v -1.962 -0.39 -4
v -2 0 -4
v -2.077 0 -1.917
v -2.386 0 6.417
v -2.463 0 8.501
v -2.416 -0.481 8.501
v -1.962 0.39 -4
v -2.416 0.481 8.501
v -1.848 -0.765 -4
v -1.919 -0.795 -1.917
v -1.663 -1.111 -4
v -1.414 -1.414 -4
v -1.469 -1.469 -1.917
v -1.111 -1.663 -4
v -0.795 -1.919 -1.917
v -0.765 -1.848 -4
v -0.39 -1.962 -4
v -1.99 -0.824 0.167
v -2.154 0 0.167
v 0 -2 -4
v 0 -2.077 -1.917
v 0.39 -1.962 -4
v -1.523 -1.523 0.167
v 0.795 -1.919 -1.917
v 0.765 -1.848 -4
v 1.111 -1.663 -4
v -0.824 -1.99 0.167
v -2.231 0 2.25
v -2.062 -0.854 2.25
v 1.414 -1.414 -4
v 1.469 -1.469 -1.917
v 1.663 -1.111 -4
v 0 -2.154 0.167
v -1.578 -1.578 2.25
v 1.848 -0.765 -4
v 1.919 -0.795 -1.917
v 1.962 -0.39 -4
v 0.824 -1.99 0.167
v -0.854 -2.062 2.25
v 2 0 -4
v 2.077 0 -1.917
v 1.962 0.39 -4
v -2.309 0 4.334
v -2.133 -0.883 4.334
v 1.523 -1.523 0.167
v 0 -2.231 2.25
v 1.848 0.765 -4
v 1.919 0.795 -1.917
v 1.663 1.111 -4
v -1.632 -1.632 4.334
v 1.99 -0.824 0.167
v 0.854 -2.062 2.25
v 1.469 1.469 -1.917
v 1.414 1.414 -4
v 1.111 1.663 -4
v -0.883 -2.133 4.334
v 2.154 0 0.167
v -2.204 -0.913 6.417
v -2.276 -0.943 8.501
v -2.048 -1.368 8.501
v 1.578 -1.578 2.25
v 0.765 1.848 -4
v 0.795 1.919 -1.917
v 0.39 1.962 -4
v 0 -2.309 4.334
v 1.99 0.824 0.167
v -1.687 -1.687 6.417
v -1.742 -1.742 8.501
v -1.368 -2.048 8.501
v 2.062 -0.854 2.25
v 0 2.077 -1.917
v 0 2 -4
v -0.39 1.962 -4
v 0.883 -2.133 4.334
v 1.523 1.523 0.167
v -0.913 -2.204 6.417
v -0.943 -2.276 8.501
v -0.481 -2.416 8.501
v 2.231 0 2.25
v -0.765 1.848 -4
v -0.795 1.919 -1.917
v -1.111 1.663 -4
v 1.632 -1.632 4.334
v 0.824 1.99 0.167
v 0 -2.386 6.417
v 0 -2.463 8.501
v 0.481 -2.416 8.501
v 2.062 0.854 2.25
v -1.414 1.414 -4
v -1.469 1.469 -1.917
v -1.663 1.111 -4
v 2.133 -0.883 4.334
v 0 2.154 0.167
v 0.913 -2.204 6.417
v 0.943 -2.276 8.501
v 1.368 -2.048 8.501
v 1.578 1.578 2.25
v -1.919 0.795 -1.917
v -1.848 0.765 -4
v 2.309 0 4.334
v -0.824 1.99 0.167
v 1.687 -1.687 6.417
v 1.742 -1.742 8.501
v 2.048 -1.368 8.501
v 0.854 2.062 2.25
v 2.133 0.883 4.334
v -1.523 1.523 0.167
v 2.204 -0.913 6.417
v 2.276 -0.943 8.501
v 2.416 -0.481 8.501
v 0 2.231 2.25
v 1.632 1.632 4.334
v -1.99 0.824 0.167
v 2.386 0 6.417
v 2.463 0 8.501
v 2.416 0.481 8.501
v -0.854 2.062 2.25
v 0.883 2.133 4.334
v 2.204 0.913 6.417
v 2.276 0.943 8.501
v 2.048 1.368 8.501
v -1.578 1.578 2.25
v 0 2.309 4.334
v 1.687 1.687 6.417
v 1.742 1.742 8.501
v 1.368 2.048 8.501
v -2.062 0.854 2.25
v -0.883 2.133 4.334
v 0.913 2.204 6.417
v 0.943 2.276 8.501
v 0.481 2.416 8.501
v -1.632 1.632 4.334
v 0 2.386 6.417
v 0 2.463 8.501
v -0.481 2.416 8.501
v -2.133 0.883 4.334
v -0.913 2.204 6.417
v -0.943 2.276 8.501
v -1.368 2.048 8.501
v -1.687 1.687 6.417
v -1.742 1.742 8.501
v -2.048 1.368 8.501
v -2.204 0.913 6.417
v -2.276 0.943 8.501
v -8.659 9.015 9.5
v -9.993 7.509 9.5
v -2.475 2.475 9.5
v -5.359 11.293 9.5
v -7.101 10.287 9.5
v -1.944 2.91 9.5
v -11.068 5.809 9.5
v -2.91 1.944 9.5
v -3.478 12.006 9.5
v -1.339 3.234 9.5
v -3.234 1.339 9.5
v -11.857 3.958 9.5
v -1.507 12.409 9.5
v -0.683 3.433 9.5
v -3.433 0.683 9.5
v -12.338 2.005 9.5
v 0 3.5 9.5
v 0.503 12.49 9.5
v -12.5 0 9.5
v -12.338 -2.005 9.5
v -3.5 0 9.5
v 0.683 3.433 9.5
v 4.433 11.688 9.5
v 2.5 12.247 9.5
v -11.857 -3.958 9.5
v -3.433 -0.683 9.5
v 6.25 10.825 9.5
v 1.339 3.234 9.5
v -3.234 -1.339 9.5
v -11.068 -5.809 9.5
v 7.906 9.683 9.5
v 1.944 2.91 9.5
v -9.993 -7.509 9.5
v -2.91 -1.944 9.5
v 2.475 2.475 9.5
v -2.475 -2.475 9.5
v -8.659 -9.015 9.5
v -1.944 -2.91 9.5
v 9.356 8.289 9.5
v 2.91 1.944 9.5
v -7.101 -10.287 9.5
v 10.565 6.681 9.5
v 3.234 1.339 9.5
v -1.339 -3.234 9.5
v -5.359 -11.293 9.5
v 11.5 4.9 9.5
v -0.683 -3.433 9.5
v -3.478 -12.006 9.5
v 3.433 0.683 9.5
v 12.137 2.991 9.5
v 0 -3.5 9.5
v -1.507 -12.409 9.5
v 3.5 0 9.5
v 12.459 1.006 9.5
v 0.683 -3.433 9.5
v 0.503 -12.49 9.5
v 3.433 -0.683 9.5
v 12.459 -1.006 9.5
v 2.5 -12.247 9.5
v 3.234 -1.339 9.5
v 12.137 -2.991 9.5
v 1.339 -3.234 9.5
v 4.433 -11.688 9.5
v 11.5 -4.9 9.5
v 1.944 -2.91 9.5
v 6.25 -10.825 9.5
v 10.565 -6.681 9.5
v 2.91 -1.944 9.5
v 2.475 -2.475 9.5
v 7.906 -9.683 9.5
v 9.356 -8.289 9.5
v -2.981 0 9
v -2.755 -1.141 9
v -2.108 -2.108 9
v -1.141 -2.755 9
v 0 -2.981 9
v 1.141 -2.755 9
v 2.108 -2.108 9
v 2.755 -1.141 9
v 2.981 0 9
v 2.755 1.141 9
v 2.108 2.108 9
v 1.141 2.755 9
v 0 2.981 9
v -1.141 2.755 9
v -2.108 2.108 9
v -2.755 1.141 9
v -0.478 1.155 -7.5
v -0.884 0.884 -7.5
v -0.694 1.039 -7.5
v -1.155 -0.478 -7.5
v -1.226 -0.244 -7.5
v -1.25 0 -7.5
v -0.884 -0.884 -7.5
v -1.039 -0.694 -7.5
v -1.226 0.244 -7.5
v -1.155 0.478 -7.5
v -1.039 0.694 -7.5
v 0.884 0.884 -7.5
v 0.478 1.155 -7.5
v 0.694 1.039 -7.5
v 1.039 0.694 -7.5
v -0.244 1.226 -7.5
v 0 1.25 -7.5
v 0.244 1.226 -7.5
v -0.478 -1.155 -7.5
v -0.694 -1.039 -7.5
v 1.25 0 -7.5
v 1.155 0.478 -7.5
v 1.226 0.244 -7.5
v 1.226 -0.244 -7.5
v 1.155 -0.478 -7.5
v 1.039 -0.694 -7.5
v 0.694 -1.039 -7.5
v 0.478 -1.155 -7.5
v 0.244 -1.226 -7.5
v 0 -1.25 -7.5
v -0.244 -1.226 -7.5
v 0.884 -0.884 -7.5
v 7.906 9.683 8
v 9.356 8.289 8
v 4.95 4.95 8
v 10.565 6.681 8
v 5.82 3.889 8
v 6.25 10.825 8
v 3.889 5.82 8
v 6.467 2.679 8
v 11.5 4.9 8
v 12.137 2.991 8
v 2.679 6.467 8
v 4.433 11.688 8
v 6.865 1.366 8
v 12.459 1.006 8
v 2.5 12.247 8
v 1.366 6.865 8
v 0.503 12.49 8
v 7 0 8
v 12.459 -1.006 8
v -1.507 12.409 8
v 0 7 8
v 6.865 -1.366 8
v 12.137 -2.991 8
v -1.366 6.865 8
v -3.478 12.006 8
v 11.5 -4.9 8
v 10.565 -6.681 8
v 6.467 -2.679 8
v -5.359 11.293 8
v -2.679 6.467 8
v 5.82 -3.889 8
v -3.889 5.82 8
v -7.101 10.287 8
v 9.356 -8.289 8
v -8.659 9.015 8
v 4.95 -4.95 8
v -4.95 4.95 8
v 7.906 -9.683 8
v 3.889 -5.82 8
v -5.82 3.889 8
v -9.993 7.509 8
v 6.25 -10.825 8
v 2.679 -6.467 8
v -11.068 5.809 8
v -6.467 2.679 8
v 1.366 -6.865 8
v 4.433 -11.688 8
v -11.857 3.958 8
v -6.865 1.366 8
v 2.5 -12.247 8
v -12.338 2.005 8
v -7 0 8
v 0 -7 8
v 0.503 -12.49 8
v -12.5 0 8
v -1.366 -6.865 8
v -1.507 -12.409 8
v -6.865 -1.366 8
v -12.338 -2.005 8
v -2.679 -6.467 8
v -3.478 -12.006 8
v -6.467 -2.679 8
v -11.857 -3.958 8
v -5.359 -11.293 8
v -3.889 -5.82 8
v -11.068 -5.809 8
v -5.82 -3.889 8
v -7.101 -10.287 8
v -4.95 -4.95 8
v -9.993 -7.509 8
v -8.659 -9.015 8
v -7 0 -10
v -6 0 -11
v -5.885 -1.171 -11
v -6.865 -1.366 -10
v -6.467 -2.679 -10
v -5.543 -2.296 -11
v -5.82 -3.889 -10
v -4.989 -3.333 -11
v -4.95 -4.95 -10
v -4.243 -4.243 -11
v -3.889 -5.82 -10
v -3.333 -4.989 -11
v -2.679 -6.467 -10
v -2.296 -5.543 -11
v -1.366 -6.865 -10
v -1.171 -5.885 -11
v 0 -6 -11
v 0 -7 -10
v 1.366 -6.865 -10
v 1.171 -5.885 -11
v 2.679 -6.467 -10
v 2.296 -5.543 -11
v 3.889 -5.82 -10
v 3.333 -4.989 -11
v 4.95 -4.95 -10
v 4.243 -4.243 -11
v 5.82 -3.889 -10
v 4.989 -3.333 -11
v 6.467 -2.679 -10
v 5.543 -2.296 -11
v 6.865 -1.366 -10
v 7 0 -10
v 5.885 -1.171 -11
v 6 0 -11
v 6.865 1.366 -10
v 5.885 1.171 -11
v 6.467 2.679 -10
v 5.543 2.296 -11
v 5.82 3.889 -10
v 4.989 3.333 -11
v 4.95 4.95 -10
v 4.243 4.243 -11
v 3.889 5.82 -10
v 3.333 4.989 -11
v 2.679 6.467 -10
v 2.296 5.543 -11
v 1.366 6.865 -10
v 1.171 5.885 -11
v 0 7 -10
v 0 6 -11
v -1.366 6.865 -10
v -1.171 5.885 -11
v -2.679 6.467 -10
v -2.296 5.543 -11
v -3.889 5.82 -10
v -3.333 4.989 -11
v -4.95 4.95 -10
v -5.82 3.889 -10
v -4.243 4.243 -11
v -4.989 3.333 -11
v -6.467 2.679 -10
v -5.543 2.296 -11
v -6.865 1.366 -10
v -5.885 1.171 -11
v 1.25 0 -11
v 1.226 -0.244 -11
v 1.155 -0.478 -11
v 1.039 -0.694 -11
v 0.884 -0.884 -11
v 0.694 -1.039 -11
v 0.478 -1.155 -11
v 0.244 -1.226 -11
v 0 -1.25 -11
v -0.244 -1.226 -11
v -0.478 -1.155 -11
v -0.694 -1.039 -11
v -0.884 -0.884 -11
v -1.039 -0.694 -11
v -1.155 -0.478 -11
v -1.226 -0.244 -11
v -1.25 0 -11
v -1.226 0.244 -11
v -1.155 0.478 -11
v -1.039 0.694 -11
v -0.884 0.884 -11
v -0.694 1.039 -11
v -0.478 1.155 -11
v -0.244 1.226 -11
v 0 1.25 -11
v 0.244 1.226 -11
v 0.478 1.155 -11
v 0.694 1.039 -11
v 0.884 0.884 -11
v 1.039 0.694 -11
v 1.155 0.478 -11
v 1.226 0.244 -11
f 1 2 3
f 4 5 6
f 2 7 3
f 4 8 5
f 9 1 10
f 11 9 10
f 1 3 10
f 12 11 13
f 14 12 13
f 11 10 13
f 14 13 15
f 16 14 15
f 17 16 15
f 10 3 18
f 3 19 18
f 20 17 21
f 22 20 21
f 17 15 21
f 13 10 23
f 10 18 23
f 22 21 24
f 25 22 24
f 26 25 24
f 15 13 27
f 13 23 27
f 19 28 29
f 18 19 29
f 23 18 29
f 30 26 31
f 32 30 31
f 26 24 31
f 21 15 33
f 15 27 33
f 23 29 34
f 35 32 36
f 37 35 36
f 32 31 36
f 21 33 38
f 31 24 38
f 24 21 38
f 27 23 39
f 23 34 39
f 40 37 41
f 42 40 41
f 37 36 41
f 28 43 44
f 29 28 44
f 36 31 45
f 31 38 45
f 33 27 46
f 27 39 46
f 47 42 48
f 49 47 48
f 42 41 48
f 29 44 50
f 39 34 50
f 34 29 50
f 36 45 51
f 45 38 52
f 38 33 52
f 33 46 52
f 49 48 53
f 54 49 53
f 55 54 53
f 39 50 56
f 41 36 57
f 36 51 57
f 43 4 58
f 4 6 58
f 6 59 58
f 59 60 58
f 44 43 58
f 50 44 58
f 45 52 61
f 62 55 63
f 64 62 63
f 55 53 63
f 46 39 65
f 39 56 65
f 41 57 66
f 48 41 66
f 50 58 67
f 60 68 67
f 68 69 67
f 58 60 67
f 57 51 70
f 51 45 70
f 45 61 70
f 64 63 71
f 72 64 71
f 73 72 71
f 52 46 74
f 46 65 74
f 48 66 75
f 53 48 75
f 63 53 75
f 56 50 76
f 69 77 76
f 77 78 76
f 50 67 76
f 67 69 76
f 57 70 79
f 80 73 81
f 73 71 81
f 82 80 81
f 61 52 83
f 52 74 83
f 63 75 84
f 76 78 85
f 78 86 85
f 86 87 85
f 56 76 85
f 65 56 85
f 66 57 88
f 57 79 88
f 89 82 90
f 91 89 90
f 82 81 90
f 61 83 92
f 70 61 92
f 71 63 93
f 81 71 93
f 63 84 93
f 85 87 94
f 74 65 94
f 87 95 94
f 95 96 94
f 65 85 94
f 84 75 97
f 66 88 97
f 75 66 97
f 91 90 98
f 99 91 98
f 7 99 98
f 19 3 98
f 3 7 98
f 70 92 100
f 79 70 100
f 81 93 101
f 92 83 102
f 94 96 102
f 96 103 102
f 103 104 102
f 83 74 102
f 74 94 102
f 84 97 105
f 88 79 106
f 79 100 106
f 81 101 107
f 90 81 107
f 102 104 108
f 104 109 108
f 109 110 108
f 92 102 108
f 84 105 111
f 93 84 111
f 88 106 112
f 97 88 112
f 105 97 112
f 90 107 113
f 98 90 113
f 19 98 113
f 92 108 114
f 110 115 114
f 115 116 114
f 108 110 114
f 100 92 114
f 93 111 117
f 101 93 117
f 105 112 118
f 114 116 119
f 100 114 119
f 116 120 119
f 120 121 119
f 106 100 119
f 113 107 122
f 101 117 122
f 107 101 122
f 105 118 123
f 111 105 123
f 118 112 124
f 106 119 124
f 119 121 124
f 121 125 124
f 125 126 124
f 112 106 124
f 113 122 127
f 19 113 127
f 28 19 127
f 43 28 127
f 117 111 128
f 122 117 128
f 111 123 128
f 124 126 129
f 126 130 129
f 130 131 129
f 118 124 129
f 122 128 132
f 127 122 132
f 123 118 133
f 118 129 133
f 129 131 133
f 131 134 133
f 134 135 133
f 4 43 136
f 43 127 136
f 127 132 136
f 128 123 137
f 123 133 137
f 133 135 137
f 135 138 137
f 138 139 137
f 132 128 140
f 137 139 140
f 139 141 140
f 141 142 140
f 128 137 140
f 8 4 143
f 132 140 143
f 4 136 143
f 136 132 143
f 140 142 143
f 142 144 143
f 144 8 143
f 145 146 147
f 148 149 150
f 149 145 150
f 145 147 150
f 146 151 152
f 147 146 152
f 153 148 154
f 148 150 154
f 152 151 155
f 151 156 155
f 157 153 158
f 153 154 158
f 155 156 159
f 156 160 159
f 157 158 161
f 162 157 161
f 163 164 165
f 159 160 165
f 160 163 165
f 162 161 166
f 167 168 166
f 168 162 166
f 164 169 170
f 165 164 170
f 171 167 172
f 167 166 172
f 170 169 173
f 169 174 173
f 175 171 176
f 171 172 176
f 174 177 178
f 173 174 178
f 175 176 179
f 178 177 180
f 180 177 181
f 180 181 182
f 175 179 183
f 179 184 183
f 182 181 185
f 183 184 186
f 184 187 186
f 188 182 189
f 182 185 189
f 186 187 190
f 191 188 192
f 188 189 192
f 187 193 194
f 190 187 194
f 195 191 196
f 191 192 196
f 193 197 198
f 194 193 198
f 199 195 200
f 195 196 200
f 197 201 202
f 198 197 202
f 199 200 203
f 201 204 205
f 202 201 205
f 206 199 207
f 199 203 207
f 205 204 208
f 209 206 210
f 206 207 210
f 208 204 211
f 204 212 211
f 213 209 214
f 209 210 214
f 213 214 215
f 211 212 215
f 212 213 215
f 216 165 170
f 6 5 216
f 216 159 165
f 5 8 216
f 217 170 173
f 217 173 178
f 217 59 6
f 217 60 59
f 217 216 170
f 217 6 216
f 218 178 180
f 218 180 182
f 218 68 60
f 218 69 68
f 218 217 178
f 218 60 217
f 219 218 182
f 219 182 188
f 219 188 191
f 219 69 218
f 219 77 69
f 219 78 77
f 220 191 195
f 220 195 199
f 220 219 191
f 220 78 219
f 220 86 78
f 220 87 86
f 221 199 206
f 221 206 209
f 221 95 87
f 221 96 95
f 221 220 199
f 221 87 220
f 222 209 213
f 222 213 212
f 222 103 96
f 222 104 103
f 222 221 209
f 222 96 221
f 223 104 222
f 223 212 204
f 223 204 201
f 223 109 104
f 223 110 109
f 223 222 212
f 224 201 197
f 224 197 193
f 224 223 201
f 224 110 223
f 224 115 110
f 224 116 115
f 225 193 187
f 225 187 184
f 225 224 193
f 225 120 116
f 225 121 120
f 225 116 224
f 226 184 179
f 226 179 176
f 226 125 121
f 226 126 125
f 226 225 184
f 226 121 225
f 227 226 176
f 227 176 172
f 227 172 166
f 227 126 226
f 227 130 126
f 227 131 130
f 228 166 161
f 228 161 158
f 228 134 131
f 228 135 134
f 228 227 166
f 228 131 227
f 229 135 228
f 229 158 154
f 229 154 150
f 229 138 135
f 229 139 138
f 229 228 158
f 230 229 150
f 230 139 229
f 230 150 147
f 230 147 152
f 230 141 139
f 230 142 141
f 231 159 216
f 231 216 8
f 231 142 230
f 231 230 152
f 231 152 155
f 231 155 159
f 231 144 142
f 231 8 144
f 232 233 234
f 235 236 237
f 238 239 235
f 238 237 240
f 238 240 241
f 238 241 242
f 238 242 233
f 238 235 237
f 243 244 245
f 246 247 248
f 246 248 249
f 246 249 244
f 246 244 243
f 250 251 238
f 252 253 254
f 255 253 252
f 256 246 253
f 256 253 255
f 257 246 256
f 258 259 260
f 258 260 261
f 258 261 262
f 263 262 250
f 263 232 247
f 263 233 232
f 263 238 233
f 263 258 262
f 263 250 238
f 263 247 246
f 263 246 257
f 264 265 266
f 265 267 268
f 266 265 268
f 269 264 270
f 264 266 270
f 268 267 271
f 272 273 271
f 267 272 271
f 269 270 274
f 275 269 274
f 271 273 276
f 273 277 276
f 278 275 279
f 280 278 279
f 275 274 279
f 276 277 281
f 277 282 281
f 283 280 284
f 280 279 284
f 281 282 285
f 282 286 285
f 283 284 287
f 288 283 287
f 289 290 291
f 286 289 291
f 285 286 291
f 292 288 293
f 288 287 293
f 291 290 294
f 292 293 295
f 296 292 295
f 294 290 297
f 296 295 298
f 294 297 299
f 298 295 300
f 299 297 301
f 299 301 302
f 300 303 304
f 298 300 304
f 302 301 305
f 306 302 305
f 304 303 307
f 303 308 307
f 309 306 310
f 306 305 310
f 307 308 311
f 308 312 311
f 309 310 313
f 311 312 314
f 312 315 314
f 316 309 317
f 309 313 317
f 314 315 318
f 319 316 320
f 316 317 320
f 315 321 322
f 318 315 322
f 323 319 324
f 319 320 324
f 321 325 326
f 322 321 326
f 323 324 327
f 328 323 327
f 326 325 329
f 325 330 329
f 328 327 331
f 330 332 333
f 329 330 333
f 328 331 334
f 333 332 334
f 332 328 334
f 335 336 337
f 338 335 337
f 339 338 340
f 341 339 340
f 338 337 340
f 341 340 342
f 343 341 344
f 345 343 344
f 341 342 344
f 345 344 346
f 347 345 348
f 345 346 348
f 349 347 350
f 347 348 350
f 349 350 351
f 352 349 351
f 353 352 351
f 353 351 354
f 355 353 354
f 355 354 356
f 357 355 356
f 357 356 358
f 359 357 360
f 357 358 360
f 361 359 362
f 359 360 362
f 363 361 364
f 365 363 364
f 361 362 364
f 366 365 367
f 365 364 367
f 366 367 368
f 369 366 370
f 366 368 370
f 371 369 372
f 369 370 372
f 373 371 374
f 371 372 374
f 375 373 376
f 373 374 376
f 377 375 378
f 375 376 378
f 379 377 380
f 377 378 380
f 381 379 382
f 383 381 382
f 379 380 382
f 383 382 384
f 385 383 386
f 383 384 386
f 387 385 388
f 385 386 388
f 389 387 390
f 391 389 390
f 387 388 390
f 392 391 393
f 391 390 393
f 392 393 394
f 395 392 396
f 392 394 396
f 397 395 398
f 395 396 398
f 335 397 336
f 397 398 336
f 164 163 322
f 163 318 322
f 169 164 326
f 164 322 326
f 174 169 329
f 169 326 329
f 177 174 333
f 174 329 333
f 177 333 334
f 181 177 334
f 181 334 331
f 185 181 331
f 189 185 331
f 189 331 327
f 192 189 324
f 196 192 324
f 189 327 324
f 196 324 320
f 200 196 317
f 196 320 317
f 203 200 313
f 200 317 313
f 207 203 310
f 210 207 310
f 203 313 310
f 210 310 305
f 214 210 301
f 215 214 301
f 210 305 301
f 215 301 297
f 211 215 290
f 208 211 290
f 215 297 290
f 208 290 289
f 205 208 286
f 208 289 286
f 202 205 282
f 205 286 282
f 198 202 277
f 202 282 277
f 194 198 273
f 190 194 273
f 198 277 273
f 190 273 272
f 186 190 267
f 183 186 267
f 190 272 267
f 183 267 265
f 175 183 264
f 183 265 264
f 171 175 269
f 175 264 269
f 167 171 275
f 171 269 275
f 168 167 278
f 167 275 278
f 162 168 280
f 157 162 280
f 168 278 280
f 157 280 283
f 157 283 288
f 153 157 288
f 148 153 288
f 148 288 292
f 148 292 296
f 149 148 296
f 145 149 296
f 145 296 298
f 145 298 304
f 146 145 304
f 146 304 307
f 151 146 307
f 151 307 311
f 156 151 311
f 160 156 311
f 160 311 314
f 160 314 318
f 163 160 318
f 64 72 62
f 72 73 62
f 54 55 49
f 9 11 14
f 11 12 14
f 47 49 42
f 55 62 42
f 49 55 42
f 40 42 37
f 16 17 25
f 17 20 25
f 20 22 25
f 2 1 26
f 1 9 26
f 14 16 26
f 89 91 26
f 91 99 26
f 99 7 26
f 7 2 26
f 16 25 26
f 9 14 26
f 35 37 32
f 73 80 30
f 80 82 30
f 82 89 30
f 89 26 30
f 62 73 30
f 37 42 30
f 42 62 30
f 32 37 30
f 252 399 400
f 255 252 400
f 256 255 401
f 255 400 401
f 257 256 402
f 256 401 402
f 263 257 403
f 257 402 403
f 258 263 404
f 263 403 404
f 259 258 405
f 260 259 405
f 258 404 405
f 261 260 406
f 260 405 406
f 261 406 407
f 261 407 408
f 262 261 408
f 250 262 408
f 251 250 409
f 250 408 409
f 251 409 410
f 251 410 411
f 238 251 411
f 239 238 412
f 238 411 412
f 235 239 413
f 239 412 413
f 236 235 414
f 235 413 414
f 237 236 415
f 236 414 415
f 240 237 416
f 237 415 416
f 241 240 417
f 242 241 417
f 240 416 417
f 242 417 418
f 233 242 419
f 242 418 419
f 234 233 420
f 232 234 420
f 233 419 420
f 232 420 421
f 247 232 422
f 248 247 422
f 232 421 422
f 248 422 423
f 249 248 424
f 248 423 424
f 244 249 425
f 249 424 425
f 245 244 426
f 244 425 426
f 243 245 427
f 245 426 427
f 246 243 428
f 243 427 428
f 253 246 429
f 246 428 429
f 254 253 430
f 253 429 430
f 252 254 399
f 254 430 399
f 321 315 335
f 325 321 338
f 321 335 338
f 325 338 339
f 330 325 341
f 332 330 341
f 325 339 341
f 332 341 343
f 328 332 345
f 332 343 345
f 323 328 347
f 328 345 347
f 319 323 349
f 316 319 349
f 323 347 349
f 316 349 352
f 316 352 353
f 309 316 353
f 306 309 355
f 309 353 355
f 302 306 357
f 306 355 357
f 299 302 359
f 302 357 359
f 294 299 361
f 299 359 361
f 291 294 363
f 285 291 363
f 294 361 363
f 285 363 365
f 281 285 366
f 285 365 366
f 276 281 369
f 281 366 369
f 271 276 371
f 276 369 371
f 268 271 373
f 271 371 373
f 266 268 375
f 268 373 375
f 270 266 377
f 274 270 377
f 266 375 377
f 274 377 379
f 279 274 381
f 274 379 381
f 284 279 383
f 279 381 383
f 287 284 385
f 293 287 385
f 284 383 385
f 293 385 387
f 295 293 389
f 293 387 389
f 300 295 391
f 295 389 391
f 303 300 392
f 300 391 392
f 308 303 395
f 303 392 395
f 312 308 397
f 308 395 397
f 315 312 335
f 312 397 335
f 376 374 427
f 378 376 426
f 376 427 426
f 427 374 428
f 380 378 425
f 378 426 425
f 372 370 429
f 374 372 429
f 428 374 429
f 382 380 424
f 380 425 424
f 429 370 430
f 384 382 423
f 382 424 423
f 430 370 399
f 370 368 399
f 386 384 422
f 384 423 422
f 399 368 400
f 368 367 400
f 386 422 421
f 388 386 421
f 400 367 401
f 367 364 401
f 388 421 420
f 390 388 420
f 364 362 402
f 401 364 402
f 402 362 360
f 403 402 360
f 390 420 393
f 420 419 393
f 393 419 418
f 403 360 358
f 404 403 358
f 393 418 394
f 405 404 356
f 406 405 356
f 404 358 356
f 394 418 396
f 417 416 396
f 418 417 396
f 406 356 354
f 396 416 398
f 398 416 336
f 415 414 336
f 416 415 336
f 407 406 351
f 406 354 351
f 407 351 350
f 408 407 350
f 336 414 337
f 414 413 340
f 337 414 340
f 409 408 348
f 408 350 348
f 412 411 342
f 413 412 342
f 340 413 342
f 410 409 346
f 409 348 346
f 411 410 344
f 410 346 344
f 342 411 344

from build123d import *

# Parameters (mm, degrees)
CHAMFER_SIZE    = 1
CHAMFER001_SIZE = 1
SKETCH016_R     = 1.25
POCKET003_DEPTH = 3.5


with BuildPart() as part:
    # Sketch010 → Revolution (revolve)
    with BuildSketch(Plane.XZ):
        Polygon((-2.5, 9.5), (-12.5, 9.5), (-12.5, 8), (-7, 8), (-7, -11), (0, -11), (0, -4), (-2, -4), align=None)
    revolve(axis=Axis((0, 0, 0), (0, 0, 1)))

    # Chamfer
    chamfer_edges = [part.edges().sort_by_distance(p)[0] for p in [
        (2.5, 0, 9.5),
    ]]
    chamfer(chamfer_edges, length=CHAMFER_SIZE)

    # Chamfer001
    chamfer001_edges = [part.edges().sort_by_distance(p)[0] for p in [
        (7, 0, -11),
    ]]
    chamfer(chamfer001_edges, length=CHAMFER001_SIZE)

    # Sketch016 (on Face4 of Chamfer001) → Pocket003 (cut)
    with BuildSketch(Plane(origin=(0, 0, -11), x_dir=(1, 0, 0), z_dir=(0, 0, -1))):
        Circle(SKETCH016_R)
    extrude(amount=-POCKET003_DEPTH, mode=Mode.SUBTRACT)


solid = part.part
